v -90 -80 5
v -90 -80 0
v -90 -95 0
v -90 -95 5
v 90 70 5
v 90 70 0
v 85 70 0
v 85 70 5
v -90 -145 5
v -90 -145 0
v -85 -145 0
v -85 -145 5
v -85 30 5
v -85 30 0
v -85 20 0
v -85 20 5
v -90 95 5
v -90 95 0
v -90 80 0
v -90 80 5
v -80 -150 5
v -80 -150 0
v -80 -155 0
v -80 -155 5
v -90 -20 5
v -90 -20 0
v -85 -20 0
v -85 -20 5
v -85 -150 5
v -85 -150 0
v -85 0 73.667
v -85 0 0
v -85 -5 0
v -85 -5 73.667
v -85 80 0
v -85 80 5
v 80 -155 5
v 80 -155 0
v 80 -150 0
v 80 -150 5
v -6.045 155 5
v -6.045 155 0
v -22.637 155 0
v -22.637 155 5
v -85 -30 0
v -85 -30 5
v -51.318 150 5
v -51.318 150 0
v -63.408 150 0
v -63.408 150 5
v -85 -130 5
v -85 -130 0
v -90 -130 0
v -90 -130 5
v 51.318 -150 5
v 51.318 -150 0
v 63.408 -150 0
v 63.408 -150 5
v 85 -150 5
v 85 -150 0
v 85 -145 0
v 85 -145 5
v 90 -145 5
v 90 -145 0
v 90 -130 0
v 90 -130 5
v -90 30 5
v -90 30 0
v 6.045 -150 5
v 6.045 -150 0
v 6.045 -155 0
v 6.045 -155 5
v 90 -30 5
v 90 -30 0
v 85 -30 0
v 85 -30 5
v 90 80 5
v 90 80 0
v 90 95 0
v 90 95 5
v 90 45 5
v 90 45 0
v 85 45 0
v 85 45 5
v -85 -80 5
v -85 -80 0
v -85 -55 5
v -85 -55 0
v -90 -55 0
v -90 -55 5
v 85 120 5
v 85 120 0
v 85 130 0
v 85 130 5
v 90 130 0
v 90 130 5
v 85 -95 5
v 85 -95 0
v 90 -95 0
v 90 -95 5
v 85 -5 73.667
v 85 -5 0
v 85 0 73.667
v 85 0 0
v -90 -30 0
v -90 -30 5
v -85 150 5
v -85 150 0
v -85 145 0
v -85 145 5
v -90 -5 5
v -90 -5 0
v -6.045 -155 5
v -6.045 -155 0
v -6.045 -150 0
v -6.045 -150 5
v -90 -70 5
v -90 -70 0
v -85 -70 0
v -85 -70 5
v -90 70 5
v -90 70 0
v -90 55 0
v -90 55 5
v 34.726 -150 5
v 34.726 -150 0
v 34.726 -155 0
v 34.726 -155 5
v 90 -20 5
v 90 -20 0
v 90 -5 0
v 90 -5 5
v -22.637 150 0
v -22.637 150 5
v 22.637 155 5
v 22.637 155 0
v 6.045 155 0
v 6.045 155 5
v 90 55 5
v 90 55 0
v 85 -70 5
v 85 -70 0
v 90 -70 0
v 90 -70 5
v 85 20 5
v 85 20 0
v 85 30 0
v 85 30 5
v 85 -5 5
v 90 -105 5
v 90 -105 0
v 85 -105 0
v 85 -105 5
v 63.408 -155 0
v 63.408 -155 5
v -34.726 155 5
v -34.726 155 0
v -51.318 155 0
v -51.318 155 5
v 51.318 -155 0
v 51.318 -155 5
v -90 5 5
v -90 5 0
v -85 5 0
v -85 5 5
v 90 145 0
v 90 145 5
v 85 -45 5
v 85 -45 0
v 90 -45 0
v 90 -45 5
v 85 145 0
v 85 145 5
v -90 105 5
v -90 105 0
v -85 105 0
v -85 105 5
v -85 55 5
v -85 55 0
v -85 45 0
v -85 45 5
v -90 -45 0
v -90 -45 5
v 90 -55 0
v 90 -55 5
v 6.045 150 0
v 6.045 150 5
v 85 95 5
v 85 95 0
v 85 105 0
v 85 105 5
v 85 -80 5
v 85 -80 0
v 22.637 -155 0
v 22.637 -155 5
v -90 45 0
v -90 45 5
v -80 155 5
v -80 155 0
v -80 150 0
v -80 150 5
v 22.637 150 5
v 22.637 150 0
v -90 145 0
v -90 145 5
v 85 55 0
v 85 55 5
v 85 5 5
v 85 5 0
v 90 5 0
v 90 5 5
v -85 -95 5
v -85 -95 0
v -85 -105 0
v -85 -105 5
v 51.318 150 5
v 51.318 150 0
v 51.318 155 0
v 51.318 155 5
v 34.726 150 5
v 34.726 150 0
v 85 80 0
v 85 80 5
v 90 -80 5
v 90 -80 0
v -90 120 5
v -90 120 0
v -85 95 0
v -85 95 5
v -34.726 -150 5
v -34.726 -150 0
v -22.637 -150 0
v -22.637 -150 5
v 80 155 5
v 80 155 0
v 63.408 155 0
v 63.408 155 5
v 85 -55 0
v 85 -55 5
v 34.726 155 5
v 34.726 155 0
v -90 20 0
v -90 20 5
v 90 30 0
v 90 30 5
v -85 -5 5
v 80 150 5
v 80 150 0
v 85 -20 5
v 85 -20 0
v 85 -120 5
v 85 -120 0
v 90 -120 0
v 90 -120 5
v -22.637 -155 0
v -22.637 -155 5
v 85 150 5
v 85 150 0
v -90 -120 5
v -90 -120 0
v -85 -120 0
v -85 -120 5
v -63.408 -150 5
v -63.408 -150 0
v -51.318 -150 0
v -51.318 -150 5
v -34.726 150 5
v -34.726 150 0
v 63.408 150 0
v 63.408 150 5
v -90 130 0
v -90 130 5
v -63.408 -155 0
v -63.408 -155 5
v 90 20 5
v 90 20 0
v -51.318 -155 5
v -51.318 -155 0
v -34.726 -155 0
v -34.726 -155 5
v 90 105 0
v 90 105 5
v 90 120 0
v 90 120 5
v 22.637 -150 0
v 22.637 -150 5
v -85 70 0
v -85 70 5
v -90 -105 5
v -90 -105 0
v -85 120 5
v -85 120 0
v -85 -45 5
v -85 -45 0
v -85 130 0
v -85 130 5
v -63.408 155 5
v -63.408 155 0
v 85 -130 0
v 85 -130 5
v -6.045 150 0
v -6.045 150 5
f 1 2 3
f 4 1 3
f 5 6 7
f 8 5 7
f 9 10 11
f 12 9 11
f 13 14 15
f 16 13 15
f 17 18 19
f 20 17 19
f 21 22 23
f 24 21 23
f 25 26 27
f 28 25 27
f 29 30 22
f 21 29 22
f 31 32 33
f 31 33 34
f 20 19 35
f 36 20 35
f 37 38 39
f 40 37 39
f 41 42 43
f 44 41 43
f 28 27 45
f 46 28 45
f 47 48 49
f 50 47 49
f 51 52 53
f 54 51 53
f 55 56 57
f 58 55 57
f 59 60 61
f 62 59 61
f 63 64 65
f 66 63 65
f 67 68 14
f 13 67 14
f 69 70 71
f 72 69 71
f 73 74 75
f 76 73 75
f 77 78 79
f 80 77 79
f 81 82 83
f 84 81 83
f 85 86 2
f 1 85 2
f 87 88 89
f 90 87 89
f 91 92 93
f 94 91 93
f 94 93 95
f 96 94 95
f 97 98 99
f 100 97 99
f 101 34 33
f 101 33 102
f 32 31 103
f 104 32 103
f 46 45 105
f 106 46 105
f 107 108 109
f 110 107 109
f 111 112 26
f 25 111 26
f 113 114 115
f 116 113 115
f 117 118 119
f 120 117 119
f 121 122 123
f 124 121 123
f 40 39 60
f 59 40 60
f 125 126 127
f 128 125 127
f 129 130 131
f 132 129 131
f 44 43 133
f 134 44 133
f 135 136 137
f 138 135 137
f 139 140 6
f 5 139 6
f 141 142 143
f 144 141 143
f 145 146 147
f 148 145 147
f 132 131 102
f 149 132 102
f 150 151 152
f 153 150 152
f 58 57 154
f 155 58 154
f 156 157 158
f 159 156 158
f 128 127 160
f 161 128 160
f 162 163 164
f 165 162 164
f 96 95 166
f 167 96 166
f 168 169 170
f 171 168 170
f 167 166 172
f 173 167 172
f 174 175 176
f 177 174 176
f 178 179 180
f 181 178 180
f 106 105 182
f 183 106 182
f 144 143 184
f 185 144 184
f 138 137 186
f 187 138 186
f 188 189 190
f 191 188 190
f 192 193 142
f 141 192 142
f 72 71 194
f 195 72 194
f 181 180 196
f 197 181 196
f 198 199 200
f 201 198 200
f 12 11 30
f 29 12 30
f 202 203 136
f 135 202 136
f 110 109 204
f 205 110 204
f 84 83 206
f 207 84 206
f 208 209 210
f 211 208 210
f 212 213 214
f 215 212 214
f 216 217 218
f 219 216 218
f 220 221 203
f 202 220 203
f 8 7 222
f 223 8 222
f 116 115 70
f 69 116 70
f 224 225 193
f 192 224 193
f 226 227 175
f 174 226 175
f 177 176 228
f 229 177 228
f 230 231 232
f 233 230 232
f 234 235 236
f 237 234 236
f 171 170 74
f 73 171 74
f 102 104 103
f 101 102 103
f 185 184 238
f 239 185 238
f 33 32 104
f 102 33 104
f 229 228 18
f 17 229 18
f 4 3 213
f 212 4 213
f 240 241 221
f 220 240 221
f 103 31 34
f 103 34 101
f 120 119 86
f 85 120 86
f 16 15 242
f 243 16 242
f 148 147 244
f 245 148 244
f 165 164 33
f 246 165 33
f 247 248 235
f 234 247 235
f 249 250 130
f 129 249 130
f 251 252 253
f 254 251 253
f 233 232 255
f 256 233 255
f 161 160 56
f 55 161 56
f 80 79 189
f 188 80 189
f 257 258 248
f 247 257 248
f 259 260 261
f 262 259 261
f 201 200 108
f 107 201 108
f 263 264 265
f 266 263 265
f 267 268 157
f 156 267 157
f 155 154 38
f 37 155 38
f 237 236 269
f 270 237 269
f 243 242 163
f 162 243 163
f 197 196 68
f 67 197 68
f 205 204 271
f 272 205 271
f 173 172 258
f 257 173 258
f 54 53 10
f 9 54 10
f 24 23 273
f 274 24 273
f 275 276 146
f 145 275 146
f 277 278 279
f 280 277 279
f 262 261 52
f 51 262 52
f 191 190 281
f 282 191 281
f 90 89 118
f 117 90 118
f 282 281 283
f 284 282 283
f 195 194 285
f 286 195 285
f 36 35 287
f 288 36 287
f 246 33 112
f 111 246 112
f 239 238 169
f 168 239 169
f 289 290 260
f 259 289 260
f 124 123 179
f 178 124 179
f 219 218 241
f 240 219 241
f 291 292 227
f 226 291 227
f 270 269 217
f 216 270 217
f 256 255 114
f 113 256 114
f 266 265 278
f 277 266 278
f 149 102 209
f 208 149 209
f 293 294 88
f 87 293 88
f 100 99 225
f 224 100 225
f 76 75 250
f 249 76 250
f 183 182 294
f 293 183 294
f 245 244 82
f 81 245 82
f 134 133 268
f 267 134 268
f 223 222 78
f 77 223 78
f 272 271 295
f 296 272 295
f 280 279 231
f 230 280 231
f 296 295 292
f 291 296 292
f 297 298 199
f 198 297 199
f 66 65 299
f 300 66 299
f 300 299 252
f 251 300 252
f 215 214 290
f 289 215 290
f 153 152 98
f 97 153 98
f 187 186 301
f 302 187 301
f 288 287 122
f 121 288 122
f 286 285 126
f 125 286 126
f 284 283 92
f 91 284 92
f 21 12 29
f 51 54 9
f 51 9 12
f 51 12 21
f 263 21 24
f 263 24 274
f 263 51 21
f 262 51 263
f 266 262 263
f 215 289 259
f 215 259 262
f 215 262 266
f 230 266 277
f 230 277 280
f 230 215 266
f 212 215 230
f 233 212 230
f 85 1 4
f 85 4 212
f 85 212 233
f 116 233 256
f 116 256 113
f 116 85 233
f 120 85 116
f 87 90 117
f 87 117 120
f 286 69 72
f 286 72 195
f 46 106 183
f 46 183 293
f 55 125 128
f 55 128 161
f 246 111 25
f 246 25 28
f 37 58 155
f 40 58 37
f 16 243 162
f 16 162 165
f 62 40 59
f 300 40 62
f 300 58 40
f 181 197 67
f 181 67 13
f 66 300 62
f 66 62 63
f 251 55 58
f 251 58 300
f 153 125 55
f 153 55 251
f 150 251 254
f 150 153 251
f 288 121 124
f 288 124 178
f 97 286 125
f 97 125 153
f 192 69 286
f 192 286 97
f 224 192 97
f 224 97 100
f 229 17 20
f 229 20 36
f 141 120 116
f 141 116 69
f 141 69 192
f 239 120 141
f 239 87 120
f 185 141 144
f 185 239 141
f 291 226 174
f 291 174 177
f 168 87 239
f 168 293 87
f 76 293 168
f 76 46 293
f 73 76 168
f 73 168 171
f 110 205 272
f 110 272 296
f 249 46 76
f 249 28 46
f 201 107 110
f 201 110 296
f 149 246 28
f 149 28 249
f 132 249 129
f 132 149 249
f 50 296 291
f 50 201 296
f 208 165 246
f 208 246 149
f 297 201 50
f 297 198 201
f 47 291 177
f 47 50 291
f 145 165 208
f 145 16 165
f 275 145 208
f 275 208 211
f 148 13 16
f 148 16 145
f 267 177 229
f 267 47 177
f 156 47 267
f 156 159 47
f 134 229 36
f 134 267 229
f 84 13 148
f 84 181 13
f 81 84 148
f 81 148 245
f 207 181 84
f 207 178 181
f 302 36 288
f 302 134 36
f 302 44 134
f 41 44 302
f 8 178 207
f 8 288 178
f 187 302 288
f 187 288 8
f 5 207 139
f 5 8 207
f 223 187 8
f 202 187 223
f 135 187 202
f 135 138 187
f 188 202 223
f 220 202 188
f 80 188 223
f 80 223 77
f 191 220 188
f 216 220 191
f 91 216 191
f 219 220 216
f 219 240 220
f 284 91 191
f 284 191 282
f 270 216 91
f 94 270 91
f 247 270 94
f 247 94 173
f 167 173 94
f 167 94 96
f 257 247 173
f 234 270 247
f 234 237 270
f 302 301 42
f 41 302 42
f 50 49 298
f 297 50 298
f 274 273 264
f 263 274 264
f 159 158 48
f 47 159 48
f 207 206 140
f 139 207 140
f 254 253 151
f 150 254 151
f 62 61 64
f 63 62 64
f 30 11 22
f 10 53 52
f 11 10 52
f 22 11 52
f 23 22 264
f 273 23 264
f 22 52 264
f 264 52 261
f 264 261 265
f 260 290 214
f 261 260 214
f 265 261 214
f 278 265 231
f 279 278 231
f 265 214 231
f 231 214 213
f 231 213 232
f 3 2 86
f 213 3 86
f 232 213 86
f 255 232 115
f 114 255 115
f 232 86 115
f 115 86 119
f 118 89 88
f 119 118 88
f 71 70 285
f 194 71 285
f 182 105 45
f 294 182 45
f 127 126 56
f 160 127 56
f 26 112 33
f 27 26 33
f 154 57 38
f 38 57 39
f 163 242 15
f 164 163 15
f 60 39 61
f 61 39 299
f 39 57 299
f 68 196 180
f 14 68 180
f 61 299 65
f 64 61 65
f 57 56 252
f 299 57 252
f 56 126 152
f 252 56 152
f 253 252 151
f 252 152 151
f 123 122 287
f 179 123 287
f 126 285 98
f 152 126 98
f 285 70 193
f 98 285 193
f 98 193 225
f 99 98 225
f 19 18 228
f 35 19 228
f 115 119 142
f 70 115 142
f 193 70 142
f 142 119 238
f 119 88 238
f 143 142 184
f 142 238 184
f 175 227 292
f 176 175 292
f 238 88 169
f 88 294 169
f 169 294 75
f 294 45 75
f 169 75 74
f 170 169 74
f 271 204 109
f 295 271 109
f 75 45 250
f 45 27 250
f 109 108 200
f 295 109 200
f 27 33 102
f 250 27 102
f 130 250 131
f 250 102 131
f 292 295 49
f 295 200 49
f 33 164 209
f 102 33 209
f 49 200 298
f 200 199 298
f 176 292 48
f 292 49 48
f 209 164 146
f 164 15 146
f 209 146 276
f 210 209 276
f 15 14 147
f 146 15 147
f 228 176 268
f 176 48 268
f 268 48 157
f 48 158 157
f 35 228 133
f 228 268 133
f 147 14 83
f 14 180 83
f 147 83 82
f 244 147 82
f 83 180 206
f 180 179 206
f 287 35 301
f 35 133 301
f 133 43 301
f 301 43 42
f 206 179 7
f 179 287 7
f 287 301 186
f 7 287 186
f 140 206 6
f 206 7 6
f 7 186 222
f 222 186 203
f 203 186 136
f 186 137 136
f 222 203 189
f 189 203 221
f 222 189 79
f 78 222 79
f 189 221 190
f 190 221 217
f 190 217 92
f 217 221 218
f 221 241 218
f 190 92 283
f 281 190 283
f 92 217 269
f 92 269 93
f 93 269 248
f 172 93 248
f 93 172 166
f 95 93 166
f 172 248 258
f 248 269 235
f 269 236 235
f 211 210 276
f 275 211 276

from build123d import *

# Parameters (mm, degrees)
F2_DEPTH = 5
F3_W     = 170
F3_H     = 73.6674442887
F4_DEPTH = 5


with BuildPart() as f2:
    # F1 (on Top) → F2 (new body)
    with BuildSketch(Plane.XY):
        Polygon((-85, -145), (-85, -150), (-80, -150), (-80, -155), (-63.4081140161, -155), (-63.4081140161, -150), (-51.3183771968, -150), (-51.3183771968, -155), (-34.7264912128, -155), (-34.7264912128, -150), (-22.6367543936, -150), (-22.6367543936, -155), (-6.0448684096, -155), (-6.0448684096, -150), (6.0448684096, -150), (6.0448684096, -155), (22.6367543936, -155), (22.6367543936, -150), (34.7264912128, -150), (34.7264912128, -155), (51.3183771968, -155), (51.3183771968, -150), (63.4081140161, -150), (63.4081140161, -155), (80, -155), (80, -150), (85, -150), (85, -145), (90, -145), (90, -130), (85, -130), (85, -120), (90, -120), (90, -105), (85, -105), (85, -95), (90, -95), (90, -80), (85, -80), (85, -70), (90, -70), (90, -55), (85, -55), (85, -45), (90, -45), (90, -30), (85, -30), (85, -20), (90, -20), (90, -5), (85, -5), (85, 5), (90, 5), (90, 20), (85, 20), (85, 30), (90, 30), (90, 45), (85, 45), (85, 55), (90, 55), (90, 70), (85, 70), (85, 80), (90, 80), (90, 95), (85, 95), (85, 105), (90, 105), (90, 120), (85, 120), (85, 130), (90, 130), (90, 145), (85, 145), (85, 150), (80, 150), (80, 155), (63.4081140161, 155), (63.4081140161, 150), (51.3183771968, 150), (51.3183771968, 155), (34.7264912128, 155), (34.7264912128, 150), (22.6367543936, 150), (22.6367543936, 155), (6.0448684096, 155), (6.0448684096, 150), (-6.0448684096, 150), (-6.0448684096, 155), (-22.6367543936, 155), (-22.6367543936, 150), (-34.7264912128, 150), (-34.7264912128, 155), (-51.3183771968, 155), (-51.3183771968, 150), (-63.4081140161, 150), (-63.4081140161, 155), (-80, 155), (-80, 150), (-85, 150), (-85, 145), (-90, 145), (-90, 130), (-85, 130), (-85, 120), (-90, 120), (-90, 105), (-85, 105), (-85, 95), (-90, 95), (-90, 80), (-85, 80), (-85, 70), (-90, 70), (-90, 55), (-85, 55), (-85, 45), (-90, 45), (-90, 30), (-85, 30), (-85, 20), (-90, 20), (-90, 5), (-85, 5), (-85, -5), (-90, -5), (-90, -20), (-85, -20), (-85, -30), (-90, -30), (-90, -45), (-85, -45), (-85, -55), (-90, -55), (-90, -70), (-85, -70), (-85, -80), (-90, -80), (-90, -95), (-85, -95), (-85, -105), (-90, -105), (-90, -120), (-85, -120), (-85, -130), (-90, -130), (-90, -145), align=None)
    extrude(amount=F2_DEPTH)


with BuildPart() as f4:
    # F3 (on Front) → F4 (new body)
    with BuildSketch(Plane.XZ):
        with Locations((0, 36.8337221444)):
            Rectangle(F3_W, F3_H)
    extrude(amount=F4_DEPTH)


solid = Compound([f2.part, f4.part])
